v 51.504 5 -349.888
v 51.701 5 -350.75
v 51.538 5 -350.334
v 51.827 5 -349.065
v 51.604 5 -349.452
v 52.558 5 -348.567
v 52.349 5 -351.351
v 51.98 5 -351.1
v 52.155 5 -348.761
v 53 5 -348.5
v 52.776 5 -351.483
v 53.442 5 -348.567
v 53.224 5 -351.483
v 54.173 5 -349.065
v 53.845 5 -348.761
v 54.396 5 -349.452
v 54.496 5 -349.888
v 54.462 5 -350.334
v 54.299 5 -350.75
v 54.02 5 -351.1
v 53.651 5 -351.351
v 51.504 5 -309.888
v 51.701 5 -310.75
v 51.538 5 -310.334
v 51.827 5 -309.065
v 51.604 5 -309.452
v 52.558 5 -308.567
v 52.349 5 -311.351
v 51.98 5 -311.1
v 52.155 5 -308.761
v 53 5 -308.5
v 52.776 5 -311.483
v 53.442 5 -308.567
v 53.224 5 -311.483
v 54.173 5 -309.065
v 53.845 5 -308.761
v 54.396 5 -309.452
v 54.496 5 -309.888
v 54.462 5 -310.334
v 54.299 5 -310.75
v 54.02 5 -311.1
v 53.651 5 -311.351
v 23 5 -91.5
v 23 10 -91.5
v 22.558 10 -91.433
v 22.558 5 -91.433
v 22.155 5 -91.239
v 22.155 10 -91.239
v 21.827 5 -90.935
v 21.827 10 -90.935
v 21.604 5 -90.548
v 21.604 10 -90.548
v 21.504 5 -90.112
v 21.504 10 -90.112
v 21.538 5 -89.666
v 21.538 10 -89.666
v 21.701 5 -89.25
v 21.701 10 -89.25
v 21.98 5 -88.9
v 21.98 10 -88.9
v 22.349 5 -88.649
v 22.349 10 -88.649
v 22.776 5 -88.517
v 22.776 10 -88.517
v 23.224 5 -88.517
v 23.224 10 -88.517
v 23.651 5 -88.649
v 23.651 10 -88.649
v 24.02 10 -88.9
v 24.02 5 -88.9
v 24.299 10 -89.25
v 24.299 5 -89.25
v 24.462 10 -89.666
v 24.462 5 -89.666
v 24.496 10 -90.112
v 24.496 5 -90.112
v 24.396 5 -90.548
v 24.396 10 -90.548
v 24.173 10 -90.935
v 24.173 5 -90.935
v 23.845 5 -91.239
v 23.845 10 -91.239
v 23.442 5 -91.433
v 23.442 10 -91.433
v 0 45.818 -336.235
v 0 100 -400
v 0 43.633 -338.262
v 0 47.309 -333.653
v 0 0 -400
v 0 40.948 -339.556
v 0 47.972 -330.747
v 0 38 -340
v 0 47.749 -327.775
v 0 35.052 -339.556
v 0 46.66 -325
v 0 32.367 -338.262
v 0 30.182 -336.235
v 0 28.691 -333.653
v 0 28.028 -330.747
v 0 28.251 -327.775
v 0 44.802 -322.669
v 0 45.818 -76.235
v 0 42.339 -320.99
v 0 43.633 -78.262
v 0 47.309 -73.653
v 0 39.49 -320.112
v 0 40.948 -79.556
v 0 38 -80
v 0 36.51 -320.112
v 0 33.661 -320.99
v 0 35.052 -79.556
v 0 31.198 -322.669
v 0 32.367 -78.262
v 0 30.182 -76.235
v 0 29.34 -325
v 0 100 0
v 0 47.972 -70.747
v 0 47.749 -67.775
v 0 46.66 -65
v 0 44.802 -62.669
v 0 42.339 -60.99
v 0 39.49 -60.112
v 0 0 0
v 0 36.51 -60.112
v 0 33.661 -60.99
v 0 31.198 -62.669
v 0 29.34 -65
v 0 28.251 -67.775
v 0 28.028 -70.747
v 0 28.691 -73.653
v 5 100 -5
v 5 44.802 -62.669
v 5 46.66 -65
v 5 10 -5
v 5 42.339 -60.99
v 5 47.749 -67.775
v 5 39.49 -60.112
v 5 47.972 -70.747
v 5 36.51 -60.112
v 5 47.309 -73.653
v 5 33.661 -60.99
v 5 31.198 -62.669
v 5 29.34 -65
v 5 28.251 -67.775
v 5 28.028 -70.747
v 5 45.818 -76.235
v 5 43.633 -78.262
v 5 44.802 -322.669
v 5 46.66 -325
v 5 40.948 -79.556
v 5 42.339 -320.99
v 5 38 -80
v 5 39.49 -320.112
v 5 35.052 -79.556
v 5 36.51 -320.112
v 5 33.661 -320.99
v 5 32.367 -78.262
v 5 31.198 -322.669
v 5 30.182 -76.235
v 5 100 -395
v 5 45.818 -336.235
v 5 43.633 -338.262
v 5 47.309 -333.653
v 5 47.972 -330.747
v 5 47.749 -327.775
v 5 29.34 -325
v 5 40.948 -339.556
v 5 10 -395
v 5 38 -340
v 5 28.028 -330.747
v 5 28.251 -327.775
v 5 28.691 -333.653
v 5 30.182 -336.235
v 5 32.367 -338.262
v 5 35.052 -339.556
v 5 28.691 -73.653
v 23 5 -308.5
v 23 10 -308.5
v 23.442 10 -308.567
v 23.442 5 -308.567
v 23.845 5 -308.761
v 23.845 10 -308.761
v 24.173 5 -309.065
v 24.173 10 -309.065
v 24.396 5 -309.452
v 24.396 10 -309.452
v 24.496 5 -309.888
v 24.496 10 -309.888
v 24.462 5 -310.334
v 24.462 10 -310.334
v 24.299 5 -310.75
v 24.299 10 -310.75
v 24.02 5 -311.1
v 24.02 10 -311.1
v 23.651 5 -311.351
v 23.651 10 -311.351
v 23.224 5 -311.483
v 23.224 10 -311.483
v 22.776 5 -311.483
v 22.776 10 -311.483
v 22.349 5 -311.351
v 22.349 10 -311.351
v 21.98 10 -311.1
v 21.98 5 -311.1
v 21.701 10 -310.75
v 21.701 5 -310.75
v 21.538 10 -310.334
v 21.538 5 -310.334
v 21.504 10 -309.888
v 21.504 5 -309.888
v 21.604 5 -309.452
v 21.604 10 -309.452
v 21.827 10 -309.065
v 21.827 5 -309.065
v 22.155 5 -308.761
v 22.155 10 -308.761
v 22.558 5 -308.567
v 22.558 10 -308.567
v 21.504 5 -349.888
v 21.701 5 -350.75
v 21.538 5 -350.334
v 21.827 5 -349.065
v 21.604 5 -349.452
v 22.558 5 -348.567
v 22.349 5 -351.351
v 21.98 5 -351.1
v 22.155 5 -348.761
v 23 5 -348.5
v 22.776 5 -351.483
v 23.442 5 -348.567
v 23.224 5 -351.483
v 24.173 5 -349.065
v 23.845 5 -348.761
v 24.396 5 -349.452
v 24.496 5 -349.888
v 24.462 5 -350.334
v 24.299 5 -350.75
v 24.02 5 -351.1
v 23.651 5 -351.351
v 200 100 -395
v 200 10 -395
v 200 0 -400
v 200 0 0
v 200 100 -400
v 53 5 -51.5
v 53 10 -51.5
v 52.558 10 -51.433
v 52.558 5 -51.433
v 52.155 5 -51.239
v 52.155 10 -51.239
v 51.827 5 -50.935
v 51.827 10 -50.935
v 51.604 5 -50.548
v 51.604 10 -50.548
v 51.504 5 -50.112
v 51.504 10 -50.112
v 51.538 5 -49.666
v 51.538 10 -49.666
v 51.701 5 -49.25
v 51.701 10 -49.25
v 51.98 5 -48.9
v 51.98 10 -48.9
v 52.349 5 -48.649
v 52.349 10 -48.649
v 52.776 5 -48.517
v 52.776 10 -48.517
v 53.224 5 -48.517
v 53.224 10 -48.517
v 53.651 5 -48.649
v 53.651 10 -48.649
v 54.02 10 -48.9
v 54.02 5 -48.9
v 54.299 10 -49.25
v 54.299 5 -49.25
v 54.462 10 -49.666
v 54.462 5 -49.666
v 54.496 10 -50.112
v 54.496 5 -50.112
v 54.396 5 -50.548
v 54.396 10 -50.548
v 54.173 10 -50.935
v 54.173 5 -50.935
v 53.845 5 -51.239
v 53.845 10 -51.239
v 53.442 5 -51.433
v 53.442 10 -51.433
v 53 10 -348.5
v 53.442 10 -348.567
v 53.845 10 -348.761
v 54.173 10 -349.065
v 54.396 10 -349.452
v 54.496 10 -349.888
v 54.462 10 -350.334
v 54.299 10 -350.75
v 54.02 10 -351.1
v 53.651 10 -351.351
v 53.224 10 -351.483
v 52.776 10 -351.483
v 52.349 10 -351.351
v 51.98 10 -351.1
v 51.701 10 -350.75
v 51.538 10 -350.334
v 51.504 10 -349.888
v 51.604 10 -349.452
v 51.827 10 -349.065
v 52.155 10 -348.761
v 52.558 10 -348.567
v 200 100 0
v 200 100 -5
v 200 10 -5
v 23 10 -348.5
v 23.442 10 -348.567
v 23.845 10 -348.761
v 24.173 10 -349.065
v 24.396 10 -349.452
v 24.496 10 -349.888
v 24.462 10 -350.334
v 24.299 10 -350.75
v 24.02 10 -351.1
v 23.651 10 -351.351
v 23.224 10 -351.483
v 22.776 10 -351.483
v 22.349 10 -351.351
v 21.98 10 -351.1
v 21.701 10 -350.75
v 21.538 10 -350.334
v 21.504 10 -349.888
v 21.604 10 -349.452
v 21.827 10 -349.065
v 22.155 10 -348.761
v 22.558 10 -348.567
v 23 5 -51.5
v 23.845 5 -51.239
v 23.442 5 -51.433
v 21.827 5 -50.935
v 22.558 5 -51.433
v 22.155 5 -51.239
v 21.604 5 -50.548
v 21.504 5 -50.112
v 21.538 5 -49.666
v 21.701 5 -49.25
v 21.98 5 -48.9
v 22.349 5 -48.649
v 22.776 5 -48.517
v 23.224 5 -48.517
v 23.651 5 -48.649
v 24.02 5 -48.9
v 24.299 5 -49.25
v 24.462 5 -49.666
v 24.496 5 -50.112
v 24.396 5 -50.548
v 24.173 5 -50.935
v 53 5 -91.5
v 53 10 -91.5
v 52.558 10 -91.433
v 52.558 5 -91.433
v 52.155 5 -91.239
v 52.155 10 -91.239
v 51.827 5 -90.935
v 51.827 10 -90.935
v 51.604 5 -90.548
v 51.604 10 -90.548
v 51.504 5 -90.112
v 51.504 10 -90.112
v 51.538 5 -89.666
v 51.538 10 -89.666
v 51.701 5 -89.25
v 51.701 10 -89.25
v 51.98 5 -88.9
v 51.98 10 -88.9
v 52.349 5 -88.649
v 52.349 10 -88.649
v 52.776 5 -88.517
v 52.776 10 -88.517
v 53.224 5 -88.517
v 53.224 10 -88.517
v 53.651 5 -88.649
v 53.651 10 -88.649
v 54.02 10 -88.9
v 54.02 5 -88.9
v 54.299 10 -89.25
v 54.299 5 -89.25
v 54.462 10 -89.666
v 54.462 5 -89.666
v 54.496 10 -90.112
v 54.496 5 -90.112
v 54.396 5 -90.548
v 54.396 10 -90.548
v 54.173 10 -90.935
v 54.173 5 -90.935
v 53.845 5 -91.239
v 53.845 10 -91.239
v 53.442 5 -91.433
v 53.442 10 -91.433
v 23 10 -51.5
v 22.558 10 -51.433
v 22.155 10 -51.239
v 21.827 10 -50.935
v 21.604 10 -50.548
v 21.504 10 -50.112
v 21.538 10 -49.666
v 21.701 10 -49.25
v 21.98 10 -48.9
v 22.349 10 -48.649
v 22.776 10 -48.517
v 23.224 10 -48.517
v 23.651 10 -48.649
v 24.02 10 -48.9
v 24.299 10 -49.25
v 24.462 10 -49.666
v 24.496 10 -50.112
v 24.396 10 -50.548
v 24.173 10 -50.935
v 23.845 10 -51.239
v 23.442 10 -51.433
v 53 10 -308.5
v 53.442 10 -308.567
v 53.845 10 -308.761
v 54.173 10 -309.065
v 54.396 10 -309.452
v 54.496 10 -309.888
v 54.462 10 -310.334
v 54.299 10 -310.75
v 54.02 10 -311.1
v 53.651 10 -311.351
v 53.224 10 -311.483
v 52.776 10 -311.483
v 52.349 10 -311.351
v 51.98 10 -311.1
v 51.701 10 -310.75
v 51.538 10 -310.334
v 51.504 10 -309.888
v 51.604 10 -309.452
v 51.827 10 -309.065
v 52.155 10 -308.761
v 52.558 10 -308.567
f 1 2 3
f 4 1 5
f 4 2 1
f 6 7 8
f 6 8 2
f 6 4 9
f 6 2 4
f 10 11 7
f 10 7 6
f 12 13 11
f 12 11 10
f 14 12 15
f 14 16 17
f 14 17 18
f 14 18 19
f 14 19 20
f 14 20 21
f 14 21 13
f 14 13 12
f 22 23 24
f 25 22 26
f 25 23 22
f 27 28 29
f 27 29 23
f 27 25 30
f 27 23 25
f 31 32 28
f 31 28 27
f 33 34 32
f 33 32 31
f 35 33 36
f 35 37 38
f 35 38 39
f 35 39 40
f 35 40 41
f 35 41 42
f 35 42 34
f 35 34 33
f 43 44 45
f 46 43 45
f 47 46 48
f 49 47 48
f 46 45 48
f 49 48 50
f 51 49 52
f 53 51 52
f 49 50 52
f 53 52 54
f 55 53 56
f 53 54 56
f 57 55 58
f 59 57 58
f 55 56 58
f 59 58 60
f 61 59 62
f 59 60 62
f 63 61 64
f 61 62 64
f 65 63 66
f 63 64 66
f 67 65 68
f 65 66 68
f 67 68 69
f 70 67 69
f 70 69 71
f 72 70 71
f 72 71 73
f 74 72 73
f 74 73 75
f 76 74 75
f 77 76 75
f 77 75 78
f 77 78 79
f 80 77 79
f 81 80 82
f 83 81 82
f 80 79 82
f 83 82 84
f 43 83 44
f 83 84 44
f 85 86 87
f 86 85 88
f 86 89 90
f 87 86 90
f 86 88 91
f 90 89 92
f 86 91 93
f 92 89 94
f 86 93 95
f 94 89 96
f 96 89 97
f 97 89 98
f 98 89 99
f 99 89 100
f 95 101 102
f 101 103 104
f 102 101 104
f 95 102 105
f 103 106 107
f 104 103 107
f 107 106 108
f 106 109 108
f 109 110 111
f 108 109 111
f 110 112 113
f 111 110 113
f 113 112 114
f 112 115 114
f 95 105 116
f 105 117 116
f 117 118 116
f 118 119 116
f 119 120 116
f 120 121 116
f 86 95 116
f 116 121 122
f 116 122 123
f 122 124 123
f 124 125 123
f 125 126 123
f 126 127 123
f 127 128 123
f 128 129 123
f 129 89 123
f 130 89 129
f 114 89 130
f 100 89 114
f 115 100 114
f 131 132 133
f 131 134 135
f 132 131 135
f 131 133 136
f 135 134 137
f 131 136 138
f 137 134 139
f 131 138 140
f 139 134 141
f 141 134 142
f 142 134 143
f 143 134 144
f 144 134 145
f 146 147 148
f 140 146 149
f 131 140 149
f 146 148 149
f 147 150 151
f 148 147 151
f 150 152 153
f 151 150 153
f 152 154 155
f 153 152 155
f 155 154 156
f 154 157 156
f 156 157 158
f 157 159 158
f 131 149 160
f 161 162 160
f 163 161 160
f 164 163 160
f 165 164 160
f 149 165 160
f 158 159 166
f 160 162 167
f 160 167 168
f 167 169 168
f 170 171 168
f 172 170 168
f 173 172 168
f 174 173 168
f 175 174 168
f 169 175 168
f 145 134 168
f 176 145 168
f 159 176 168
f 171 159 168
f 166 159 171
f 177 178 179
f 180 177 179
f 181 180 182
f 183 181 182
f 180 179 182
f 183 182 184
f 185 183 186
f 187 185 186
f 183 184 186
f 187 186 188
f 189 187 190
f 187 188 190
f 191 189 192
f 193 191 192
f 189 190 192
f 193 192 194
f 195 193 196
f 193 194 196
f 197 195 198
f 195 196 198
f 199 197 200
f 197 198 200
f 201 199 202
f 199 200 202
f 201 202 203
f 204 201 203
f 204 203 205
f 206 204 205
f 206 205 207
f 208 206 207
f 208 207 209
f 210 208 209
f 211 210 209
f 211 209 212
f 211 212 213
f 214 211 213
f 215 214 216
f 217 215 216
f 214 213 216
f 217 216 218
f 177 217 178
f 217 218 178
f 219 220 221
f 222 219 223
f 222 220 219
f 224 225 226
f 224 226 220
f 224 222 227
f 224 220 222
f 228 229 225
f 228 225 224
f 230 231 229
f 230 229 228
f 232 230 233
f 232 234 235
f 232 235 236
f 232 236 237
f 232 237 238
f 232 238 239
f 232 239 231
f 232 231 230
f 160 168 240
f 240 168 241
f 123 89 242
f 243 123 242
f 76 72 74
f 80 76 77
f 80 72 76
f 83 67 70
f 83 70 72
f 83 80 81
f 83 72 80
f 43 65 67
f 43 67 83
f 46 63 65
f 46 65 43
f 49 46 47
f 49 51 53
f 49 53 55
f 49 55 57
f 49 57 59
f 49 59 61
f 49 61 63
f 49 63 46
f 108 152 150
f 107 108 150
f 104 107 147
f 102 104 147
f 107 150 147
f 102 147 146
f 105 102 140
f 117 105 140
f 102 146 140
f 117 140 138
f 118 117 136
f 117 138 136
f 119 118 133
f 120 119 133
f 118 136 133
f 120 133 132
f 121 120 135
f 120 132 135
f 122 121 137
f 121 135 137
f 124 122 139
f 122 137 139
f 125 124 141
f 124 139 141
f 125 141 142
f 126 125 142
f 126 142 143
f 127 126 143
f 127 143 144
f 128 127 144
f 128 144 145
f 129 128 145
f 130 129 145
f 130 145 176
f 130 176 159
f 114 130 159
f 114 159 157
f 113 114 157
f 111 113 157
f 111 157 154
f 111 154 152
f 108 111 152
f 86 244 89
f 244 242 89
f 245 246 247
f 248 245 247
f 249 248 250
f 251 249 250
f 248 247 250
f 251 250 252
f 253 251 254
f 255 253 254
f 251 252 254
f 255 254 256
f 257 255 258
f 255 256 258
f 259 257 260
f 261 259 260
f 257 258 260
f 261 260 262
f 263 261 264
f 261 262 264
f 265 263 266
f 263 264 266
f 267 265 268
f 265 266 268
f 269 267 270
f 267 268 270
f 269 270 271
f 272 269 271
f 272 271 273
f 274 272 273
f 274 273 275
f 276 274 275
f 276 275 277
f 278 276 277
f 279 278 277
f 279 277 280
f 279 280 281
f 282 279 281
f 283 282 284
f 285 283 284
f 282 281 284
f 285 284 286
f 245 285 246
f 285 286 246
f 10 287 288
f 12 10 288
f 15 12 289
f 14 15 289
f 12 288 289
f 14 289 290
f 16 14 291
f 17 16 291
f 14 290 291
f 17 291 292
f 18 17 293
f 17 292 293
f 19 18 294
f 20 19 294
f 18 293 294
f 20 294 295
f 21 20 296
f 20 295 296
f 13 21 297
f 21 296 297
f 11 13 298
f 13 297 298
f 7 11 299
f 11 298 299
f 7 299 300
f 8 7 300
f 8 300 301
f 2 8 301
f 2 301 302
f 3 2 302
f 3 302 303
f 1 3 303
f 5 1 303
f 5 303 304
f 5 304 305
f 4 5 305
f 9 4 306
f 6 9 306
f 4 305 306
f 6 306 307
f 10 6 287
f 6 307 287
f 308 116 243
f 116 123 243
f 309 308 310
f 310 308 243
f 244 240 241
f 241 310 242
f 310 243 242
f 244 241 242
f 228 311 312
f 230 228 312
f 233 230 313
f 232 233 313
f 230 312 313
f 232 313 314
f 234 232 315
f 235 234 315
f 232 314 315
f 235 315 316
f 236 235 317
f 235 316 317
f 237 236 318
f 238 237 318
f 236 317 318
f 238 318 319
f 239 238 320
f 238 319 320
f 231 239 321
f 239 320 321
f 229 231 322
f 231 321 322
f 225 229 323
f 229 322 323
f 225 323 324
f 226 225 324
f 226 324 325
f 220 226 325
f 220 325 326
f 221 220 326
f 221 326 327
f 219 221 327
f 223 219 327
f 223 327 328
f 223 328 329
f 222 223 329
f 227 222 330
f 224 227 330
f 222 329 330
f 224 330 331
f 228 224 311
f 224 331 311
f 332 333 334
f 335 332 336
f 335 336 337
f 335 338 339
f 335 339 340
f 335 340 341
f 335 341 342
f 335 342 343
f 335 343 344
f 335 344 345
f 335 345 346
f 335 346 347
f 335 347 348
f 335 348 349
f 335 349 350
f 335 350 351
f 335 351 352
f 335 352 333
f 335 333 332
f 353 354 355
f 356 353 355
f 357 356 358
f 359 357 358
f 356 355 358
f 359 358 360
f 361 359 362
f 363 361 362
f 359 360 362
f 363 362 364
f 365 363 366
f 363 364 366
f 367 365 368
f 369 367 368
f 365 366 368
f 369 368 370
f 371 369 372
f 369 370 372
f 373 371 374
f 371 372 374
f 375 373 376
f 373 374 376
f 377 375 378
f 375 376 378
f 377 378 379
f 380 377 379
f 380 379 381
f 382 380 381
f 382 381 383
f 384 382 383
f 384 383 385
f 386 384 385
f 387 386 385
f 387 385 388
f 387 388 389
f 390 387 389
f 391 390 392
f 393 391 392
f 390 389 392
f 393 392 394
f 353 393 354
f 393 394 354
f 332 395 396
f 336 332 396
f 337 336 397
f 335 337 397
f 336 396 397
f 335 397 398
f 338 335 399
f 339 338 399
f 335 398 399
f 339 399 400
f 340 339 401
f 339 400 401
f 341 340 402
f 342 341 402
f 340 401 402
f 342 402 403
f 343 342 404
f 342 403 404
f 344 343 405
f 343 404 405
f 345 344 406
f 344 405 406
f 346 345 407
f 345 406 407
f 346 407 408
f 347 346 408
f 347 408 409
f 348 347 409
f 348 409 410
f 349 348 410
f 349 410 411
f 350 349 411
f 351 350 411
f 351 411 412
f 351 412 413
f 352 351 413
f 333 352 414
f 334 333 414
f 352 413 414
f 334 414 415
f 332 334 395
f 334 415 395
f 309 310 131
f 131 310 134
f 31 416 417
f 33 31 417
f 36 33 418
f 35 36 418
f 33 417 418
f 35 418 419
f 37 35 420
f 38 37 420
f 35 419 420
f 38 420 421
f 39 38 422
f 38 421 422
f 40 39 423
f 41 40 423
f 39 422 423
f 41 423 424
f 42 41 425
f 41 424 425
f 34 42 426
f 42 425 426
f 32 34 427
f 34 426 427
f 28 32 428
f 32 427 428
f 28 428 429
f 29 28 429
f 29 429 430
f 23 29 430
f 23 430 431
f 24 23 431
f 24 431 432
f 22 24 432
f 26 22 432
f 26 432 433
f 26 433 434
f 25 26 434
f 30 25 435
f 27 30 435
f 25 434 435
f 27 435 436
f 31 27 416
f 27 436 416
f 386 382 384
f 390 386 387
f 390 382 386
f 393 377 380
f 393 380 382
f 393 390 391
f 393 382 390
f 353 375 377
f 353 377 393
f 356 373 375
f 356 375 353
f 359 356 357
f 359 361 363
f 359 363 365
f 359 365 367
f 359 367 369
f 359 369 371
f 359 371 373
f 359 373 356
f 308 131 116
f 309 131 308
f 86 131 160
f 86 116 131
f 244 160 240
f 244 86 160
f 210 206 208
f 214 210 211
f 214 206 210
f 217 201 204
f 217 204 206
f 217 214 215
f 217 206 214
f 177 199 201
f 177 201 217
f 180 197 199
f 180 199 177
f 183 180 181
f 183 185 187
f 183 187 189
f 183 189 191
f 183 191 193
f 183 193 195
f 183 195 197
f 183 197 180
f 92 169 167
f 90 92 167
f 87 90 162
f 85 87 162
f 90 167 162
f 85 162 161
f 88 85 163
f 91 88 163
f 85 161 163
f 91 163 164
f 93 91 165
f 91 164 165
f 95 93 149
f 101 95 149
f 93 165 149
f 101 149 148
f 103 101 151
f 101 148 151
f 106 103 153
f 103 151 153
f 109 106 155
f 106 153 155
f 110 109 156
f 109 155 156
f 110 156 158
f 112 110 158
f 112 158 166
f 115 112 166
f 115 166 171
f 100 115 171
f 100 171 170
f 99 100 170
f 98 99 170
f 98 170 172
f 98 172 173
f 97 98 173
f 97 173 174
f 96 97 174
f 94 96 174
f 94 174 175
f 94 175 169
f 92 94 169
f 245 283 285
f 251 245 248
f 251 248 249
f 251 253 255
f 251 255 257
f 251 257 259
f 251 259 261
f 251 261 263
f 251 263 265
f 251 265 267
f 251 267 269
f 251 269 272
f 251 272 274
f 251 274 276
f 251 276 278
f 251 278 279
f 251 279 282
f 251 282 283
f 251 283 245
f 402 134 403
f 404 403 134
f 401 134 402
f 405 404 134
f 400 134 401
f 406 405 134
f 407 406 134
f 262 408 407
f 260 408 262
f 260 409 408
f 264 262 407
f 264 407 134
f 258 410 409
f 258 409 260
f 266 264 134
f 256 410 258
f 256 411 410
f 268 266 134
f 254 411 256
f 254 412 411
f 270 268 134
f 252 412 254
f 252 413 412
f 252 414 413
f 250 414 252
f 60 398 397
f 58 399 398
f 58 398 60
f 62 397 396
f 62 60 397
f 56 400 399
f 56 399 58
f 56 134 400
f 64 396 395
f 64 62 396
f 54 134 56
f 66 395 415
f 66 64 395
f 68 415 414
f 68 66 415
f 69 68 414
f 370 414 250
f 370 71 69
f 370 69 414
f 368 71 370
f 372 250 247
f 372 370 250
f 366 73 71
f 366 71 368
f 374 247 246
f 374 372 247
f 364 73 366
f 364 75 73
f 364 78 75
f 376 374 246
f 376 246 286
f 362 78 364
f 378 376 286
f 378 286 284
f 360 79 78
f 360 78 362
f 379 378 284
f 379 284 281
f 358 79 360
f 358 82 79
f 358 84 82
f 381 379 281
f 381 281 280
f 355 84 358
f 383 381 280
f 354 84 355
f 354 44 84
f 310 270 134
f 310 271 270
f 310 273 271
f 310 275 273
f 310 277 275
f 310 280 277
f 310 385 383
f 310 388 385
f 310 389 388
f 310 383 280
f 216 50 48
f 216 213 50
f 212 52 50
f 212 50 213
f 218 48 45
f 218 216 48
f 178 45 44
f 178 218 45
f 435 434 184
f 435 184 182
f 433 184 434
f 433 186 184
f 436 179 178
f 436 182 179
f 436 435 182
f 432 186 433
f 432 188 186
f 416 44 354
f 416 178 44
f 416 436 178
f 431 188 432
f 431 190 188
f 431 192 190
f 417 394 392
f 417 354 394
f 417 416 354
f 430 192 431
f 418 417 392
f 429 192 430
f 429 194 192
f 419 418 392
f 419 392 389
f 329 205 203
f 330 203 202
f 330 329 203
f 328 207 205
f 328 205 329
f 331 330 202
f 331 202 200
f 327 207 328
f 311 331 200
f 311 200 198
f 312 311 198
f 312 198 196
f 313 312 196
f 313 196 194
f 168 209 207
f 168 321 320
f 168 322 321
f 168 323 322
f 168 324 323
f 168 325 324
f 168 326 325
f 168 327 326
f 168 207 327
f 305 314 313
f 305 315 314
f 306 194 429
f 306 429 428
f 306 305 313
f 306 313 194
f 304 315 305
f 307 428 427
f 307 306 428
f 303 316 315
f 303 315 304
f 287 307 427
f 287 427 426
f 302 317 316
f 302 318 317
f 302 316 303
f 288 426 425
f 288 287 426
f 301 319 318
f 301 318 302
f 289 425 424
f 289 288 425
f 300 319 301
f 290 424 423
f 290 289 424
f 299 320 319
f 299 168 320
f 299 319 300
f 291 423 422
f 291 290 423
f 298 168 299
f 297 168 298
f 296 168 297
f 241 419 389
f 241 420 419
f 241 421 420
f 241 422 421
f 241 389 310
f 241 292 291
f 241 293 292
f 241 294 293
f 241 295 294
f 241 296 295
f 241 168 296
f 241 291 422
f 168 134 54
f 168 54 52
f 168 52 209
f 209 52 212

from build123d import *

# Parameters (mm, degrees)
ESQUISSE1_W             = 200
ESQUISSE1_H             = 400
BOSS_EXTRU_1_DEPTH      = 10
BOSS_EXTRU_2_DEPTH      = 90
ENL_V_MAT_EXTRU_1_REACH = 458.098
ESQUISSE3_R             = 10
ESQUISSE4_R             = 1.5
ENL_V_MAT_EXTRU_2_DEPTH = 5


with BuildPart() as part:
    # Esquisse1 → Boss.-Extru.1 (new body)
    with BuildSketch(Plane(origin=(0, 0, 0), x_dir=(1, 0, 0), z_dir=(0, 1, 0))):
        with Locations((100, 200)):
            Rectangle(ESQUISSE1_W, ESQUISSE1_H)
    extrude(amount=BOSS_EXTRU_1_DEPTH)

    # Esquisse2 → Boss.-Extru.2 (add)
    with BuildSketch(Plane(origin=(0, 10, 0), x_dir=(1, 0, 0), z_dir=(0, 1, 0))):
        Polygon((5, 5), (5, 395), (200, 395), (200, 400), (0, 400), (0, 0), (200, 0), (200, 5), align=None)
    extrude(amount=BOSS_EXTRU_2_DEPTH)

    # Esquisse3 → Enlèv. mat.-Extru.1 (cut, up to next)
    with BuildSketch(Plane(origin=(5, 0, 0), x_dir=(0, 0, -1), z_dir=(1, 0, 0)), mode=Mode.PRIVATE) as enl_v_mat_extru_1_sk1:
        with Locations((70, 38)):
            Circle(ESQUISSE3_R)
    enl_v_mat_extru_1_tool1 = extrude(enl_v_mat_extru_1_sk1.sketch, amount=-ENL_V_MAT_EXTRU_1_REACH, mode=Mode.PRIVATE) & part.part
    # Esquisse3 → Enlèv. mat.-Extru.1 (cut, up to next)
    with BuildSketch(Plane(origin=(5, 0, 0), x_dir=(0, 0, -1), z_dir=(1, 0, 0)), mode=Mode.PRIVATE) as enl_v_mat_extru_1_sk2:
        with Locations((330, 38)):
            Circle(ESQUISSE3_R)
    enl_v_mat_extru_1_tool2 = extrude(enl_v_mat_extru_1_sk2.sketch, amount=-ENL_V_MAT_EXTRU_1_REACH, mode=Mode.PRIVATE) & part.part
    add(enl_v_mat_extru_1_tool1.solids().sort_by_distance((5, 38, -70))[0], mode=Mode.SUBTRACT)
    add(enl_v_mat_extru_1_tool2.solids().sort_by_distance((5, 38, -330))[0], mode=Mode.SUBTRACT)

    # Esquisse4 → Enlèv. mat.-Extru.2 (cut)
    with BuildSketch(Plane(origin=(0, 10, 0), x_dir=(1, 0, 0), z_dir=(0, 1, 0))):
        with Locations(Location((23, 350, 0), (0, 0, 270))):
            Circle(ESQUISSE4_R)
        with Locations(Location((53, 350, 0), (0, 0, 270))):
            Circle(ESQUISSE4_R)
        with Locations(Location((53, 310, 0), (0, 0, 270))):
            Circle(ESQUISSE4_R)
        with Locations(Location((23, 310, 0), (0, 0, 270))):
            Circle(ESQUISSE4_R)
        with Locations(Location((23, 90, 0), (0, 0, 90))):
            Circle(ESQUISSE4_R)
        with Locations(Location((53, 90, 0), (0, 0, 90))):
            Circle(ESQUISSE4_R)
        with Locations(Location((53, 50, 0), (0, 0, 90))):
            Circle(ESQUISSE4_R)
        with Locations(Location((23, 50, 0), (0, 0, 90))):
            Circle(ESQUISSE4_R)
    extrude(amount=-ENL_V_MAT_EXTRU_2_DEPTH, mode=Mode.SUBTRACT)


solid = part.part
